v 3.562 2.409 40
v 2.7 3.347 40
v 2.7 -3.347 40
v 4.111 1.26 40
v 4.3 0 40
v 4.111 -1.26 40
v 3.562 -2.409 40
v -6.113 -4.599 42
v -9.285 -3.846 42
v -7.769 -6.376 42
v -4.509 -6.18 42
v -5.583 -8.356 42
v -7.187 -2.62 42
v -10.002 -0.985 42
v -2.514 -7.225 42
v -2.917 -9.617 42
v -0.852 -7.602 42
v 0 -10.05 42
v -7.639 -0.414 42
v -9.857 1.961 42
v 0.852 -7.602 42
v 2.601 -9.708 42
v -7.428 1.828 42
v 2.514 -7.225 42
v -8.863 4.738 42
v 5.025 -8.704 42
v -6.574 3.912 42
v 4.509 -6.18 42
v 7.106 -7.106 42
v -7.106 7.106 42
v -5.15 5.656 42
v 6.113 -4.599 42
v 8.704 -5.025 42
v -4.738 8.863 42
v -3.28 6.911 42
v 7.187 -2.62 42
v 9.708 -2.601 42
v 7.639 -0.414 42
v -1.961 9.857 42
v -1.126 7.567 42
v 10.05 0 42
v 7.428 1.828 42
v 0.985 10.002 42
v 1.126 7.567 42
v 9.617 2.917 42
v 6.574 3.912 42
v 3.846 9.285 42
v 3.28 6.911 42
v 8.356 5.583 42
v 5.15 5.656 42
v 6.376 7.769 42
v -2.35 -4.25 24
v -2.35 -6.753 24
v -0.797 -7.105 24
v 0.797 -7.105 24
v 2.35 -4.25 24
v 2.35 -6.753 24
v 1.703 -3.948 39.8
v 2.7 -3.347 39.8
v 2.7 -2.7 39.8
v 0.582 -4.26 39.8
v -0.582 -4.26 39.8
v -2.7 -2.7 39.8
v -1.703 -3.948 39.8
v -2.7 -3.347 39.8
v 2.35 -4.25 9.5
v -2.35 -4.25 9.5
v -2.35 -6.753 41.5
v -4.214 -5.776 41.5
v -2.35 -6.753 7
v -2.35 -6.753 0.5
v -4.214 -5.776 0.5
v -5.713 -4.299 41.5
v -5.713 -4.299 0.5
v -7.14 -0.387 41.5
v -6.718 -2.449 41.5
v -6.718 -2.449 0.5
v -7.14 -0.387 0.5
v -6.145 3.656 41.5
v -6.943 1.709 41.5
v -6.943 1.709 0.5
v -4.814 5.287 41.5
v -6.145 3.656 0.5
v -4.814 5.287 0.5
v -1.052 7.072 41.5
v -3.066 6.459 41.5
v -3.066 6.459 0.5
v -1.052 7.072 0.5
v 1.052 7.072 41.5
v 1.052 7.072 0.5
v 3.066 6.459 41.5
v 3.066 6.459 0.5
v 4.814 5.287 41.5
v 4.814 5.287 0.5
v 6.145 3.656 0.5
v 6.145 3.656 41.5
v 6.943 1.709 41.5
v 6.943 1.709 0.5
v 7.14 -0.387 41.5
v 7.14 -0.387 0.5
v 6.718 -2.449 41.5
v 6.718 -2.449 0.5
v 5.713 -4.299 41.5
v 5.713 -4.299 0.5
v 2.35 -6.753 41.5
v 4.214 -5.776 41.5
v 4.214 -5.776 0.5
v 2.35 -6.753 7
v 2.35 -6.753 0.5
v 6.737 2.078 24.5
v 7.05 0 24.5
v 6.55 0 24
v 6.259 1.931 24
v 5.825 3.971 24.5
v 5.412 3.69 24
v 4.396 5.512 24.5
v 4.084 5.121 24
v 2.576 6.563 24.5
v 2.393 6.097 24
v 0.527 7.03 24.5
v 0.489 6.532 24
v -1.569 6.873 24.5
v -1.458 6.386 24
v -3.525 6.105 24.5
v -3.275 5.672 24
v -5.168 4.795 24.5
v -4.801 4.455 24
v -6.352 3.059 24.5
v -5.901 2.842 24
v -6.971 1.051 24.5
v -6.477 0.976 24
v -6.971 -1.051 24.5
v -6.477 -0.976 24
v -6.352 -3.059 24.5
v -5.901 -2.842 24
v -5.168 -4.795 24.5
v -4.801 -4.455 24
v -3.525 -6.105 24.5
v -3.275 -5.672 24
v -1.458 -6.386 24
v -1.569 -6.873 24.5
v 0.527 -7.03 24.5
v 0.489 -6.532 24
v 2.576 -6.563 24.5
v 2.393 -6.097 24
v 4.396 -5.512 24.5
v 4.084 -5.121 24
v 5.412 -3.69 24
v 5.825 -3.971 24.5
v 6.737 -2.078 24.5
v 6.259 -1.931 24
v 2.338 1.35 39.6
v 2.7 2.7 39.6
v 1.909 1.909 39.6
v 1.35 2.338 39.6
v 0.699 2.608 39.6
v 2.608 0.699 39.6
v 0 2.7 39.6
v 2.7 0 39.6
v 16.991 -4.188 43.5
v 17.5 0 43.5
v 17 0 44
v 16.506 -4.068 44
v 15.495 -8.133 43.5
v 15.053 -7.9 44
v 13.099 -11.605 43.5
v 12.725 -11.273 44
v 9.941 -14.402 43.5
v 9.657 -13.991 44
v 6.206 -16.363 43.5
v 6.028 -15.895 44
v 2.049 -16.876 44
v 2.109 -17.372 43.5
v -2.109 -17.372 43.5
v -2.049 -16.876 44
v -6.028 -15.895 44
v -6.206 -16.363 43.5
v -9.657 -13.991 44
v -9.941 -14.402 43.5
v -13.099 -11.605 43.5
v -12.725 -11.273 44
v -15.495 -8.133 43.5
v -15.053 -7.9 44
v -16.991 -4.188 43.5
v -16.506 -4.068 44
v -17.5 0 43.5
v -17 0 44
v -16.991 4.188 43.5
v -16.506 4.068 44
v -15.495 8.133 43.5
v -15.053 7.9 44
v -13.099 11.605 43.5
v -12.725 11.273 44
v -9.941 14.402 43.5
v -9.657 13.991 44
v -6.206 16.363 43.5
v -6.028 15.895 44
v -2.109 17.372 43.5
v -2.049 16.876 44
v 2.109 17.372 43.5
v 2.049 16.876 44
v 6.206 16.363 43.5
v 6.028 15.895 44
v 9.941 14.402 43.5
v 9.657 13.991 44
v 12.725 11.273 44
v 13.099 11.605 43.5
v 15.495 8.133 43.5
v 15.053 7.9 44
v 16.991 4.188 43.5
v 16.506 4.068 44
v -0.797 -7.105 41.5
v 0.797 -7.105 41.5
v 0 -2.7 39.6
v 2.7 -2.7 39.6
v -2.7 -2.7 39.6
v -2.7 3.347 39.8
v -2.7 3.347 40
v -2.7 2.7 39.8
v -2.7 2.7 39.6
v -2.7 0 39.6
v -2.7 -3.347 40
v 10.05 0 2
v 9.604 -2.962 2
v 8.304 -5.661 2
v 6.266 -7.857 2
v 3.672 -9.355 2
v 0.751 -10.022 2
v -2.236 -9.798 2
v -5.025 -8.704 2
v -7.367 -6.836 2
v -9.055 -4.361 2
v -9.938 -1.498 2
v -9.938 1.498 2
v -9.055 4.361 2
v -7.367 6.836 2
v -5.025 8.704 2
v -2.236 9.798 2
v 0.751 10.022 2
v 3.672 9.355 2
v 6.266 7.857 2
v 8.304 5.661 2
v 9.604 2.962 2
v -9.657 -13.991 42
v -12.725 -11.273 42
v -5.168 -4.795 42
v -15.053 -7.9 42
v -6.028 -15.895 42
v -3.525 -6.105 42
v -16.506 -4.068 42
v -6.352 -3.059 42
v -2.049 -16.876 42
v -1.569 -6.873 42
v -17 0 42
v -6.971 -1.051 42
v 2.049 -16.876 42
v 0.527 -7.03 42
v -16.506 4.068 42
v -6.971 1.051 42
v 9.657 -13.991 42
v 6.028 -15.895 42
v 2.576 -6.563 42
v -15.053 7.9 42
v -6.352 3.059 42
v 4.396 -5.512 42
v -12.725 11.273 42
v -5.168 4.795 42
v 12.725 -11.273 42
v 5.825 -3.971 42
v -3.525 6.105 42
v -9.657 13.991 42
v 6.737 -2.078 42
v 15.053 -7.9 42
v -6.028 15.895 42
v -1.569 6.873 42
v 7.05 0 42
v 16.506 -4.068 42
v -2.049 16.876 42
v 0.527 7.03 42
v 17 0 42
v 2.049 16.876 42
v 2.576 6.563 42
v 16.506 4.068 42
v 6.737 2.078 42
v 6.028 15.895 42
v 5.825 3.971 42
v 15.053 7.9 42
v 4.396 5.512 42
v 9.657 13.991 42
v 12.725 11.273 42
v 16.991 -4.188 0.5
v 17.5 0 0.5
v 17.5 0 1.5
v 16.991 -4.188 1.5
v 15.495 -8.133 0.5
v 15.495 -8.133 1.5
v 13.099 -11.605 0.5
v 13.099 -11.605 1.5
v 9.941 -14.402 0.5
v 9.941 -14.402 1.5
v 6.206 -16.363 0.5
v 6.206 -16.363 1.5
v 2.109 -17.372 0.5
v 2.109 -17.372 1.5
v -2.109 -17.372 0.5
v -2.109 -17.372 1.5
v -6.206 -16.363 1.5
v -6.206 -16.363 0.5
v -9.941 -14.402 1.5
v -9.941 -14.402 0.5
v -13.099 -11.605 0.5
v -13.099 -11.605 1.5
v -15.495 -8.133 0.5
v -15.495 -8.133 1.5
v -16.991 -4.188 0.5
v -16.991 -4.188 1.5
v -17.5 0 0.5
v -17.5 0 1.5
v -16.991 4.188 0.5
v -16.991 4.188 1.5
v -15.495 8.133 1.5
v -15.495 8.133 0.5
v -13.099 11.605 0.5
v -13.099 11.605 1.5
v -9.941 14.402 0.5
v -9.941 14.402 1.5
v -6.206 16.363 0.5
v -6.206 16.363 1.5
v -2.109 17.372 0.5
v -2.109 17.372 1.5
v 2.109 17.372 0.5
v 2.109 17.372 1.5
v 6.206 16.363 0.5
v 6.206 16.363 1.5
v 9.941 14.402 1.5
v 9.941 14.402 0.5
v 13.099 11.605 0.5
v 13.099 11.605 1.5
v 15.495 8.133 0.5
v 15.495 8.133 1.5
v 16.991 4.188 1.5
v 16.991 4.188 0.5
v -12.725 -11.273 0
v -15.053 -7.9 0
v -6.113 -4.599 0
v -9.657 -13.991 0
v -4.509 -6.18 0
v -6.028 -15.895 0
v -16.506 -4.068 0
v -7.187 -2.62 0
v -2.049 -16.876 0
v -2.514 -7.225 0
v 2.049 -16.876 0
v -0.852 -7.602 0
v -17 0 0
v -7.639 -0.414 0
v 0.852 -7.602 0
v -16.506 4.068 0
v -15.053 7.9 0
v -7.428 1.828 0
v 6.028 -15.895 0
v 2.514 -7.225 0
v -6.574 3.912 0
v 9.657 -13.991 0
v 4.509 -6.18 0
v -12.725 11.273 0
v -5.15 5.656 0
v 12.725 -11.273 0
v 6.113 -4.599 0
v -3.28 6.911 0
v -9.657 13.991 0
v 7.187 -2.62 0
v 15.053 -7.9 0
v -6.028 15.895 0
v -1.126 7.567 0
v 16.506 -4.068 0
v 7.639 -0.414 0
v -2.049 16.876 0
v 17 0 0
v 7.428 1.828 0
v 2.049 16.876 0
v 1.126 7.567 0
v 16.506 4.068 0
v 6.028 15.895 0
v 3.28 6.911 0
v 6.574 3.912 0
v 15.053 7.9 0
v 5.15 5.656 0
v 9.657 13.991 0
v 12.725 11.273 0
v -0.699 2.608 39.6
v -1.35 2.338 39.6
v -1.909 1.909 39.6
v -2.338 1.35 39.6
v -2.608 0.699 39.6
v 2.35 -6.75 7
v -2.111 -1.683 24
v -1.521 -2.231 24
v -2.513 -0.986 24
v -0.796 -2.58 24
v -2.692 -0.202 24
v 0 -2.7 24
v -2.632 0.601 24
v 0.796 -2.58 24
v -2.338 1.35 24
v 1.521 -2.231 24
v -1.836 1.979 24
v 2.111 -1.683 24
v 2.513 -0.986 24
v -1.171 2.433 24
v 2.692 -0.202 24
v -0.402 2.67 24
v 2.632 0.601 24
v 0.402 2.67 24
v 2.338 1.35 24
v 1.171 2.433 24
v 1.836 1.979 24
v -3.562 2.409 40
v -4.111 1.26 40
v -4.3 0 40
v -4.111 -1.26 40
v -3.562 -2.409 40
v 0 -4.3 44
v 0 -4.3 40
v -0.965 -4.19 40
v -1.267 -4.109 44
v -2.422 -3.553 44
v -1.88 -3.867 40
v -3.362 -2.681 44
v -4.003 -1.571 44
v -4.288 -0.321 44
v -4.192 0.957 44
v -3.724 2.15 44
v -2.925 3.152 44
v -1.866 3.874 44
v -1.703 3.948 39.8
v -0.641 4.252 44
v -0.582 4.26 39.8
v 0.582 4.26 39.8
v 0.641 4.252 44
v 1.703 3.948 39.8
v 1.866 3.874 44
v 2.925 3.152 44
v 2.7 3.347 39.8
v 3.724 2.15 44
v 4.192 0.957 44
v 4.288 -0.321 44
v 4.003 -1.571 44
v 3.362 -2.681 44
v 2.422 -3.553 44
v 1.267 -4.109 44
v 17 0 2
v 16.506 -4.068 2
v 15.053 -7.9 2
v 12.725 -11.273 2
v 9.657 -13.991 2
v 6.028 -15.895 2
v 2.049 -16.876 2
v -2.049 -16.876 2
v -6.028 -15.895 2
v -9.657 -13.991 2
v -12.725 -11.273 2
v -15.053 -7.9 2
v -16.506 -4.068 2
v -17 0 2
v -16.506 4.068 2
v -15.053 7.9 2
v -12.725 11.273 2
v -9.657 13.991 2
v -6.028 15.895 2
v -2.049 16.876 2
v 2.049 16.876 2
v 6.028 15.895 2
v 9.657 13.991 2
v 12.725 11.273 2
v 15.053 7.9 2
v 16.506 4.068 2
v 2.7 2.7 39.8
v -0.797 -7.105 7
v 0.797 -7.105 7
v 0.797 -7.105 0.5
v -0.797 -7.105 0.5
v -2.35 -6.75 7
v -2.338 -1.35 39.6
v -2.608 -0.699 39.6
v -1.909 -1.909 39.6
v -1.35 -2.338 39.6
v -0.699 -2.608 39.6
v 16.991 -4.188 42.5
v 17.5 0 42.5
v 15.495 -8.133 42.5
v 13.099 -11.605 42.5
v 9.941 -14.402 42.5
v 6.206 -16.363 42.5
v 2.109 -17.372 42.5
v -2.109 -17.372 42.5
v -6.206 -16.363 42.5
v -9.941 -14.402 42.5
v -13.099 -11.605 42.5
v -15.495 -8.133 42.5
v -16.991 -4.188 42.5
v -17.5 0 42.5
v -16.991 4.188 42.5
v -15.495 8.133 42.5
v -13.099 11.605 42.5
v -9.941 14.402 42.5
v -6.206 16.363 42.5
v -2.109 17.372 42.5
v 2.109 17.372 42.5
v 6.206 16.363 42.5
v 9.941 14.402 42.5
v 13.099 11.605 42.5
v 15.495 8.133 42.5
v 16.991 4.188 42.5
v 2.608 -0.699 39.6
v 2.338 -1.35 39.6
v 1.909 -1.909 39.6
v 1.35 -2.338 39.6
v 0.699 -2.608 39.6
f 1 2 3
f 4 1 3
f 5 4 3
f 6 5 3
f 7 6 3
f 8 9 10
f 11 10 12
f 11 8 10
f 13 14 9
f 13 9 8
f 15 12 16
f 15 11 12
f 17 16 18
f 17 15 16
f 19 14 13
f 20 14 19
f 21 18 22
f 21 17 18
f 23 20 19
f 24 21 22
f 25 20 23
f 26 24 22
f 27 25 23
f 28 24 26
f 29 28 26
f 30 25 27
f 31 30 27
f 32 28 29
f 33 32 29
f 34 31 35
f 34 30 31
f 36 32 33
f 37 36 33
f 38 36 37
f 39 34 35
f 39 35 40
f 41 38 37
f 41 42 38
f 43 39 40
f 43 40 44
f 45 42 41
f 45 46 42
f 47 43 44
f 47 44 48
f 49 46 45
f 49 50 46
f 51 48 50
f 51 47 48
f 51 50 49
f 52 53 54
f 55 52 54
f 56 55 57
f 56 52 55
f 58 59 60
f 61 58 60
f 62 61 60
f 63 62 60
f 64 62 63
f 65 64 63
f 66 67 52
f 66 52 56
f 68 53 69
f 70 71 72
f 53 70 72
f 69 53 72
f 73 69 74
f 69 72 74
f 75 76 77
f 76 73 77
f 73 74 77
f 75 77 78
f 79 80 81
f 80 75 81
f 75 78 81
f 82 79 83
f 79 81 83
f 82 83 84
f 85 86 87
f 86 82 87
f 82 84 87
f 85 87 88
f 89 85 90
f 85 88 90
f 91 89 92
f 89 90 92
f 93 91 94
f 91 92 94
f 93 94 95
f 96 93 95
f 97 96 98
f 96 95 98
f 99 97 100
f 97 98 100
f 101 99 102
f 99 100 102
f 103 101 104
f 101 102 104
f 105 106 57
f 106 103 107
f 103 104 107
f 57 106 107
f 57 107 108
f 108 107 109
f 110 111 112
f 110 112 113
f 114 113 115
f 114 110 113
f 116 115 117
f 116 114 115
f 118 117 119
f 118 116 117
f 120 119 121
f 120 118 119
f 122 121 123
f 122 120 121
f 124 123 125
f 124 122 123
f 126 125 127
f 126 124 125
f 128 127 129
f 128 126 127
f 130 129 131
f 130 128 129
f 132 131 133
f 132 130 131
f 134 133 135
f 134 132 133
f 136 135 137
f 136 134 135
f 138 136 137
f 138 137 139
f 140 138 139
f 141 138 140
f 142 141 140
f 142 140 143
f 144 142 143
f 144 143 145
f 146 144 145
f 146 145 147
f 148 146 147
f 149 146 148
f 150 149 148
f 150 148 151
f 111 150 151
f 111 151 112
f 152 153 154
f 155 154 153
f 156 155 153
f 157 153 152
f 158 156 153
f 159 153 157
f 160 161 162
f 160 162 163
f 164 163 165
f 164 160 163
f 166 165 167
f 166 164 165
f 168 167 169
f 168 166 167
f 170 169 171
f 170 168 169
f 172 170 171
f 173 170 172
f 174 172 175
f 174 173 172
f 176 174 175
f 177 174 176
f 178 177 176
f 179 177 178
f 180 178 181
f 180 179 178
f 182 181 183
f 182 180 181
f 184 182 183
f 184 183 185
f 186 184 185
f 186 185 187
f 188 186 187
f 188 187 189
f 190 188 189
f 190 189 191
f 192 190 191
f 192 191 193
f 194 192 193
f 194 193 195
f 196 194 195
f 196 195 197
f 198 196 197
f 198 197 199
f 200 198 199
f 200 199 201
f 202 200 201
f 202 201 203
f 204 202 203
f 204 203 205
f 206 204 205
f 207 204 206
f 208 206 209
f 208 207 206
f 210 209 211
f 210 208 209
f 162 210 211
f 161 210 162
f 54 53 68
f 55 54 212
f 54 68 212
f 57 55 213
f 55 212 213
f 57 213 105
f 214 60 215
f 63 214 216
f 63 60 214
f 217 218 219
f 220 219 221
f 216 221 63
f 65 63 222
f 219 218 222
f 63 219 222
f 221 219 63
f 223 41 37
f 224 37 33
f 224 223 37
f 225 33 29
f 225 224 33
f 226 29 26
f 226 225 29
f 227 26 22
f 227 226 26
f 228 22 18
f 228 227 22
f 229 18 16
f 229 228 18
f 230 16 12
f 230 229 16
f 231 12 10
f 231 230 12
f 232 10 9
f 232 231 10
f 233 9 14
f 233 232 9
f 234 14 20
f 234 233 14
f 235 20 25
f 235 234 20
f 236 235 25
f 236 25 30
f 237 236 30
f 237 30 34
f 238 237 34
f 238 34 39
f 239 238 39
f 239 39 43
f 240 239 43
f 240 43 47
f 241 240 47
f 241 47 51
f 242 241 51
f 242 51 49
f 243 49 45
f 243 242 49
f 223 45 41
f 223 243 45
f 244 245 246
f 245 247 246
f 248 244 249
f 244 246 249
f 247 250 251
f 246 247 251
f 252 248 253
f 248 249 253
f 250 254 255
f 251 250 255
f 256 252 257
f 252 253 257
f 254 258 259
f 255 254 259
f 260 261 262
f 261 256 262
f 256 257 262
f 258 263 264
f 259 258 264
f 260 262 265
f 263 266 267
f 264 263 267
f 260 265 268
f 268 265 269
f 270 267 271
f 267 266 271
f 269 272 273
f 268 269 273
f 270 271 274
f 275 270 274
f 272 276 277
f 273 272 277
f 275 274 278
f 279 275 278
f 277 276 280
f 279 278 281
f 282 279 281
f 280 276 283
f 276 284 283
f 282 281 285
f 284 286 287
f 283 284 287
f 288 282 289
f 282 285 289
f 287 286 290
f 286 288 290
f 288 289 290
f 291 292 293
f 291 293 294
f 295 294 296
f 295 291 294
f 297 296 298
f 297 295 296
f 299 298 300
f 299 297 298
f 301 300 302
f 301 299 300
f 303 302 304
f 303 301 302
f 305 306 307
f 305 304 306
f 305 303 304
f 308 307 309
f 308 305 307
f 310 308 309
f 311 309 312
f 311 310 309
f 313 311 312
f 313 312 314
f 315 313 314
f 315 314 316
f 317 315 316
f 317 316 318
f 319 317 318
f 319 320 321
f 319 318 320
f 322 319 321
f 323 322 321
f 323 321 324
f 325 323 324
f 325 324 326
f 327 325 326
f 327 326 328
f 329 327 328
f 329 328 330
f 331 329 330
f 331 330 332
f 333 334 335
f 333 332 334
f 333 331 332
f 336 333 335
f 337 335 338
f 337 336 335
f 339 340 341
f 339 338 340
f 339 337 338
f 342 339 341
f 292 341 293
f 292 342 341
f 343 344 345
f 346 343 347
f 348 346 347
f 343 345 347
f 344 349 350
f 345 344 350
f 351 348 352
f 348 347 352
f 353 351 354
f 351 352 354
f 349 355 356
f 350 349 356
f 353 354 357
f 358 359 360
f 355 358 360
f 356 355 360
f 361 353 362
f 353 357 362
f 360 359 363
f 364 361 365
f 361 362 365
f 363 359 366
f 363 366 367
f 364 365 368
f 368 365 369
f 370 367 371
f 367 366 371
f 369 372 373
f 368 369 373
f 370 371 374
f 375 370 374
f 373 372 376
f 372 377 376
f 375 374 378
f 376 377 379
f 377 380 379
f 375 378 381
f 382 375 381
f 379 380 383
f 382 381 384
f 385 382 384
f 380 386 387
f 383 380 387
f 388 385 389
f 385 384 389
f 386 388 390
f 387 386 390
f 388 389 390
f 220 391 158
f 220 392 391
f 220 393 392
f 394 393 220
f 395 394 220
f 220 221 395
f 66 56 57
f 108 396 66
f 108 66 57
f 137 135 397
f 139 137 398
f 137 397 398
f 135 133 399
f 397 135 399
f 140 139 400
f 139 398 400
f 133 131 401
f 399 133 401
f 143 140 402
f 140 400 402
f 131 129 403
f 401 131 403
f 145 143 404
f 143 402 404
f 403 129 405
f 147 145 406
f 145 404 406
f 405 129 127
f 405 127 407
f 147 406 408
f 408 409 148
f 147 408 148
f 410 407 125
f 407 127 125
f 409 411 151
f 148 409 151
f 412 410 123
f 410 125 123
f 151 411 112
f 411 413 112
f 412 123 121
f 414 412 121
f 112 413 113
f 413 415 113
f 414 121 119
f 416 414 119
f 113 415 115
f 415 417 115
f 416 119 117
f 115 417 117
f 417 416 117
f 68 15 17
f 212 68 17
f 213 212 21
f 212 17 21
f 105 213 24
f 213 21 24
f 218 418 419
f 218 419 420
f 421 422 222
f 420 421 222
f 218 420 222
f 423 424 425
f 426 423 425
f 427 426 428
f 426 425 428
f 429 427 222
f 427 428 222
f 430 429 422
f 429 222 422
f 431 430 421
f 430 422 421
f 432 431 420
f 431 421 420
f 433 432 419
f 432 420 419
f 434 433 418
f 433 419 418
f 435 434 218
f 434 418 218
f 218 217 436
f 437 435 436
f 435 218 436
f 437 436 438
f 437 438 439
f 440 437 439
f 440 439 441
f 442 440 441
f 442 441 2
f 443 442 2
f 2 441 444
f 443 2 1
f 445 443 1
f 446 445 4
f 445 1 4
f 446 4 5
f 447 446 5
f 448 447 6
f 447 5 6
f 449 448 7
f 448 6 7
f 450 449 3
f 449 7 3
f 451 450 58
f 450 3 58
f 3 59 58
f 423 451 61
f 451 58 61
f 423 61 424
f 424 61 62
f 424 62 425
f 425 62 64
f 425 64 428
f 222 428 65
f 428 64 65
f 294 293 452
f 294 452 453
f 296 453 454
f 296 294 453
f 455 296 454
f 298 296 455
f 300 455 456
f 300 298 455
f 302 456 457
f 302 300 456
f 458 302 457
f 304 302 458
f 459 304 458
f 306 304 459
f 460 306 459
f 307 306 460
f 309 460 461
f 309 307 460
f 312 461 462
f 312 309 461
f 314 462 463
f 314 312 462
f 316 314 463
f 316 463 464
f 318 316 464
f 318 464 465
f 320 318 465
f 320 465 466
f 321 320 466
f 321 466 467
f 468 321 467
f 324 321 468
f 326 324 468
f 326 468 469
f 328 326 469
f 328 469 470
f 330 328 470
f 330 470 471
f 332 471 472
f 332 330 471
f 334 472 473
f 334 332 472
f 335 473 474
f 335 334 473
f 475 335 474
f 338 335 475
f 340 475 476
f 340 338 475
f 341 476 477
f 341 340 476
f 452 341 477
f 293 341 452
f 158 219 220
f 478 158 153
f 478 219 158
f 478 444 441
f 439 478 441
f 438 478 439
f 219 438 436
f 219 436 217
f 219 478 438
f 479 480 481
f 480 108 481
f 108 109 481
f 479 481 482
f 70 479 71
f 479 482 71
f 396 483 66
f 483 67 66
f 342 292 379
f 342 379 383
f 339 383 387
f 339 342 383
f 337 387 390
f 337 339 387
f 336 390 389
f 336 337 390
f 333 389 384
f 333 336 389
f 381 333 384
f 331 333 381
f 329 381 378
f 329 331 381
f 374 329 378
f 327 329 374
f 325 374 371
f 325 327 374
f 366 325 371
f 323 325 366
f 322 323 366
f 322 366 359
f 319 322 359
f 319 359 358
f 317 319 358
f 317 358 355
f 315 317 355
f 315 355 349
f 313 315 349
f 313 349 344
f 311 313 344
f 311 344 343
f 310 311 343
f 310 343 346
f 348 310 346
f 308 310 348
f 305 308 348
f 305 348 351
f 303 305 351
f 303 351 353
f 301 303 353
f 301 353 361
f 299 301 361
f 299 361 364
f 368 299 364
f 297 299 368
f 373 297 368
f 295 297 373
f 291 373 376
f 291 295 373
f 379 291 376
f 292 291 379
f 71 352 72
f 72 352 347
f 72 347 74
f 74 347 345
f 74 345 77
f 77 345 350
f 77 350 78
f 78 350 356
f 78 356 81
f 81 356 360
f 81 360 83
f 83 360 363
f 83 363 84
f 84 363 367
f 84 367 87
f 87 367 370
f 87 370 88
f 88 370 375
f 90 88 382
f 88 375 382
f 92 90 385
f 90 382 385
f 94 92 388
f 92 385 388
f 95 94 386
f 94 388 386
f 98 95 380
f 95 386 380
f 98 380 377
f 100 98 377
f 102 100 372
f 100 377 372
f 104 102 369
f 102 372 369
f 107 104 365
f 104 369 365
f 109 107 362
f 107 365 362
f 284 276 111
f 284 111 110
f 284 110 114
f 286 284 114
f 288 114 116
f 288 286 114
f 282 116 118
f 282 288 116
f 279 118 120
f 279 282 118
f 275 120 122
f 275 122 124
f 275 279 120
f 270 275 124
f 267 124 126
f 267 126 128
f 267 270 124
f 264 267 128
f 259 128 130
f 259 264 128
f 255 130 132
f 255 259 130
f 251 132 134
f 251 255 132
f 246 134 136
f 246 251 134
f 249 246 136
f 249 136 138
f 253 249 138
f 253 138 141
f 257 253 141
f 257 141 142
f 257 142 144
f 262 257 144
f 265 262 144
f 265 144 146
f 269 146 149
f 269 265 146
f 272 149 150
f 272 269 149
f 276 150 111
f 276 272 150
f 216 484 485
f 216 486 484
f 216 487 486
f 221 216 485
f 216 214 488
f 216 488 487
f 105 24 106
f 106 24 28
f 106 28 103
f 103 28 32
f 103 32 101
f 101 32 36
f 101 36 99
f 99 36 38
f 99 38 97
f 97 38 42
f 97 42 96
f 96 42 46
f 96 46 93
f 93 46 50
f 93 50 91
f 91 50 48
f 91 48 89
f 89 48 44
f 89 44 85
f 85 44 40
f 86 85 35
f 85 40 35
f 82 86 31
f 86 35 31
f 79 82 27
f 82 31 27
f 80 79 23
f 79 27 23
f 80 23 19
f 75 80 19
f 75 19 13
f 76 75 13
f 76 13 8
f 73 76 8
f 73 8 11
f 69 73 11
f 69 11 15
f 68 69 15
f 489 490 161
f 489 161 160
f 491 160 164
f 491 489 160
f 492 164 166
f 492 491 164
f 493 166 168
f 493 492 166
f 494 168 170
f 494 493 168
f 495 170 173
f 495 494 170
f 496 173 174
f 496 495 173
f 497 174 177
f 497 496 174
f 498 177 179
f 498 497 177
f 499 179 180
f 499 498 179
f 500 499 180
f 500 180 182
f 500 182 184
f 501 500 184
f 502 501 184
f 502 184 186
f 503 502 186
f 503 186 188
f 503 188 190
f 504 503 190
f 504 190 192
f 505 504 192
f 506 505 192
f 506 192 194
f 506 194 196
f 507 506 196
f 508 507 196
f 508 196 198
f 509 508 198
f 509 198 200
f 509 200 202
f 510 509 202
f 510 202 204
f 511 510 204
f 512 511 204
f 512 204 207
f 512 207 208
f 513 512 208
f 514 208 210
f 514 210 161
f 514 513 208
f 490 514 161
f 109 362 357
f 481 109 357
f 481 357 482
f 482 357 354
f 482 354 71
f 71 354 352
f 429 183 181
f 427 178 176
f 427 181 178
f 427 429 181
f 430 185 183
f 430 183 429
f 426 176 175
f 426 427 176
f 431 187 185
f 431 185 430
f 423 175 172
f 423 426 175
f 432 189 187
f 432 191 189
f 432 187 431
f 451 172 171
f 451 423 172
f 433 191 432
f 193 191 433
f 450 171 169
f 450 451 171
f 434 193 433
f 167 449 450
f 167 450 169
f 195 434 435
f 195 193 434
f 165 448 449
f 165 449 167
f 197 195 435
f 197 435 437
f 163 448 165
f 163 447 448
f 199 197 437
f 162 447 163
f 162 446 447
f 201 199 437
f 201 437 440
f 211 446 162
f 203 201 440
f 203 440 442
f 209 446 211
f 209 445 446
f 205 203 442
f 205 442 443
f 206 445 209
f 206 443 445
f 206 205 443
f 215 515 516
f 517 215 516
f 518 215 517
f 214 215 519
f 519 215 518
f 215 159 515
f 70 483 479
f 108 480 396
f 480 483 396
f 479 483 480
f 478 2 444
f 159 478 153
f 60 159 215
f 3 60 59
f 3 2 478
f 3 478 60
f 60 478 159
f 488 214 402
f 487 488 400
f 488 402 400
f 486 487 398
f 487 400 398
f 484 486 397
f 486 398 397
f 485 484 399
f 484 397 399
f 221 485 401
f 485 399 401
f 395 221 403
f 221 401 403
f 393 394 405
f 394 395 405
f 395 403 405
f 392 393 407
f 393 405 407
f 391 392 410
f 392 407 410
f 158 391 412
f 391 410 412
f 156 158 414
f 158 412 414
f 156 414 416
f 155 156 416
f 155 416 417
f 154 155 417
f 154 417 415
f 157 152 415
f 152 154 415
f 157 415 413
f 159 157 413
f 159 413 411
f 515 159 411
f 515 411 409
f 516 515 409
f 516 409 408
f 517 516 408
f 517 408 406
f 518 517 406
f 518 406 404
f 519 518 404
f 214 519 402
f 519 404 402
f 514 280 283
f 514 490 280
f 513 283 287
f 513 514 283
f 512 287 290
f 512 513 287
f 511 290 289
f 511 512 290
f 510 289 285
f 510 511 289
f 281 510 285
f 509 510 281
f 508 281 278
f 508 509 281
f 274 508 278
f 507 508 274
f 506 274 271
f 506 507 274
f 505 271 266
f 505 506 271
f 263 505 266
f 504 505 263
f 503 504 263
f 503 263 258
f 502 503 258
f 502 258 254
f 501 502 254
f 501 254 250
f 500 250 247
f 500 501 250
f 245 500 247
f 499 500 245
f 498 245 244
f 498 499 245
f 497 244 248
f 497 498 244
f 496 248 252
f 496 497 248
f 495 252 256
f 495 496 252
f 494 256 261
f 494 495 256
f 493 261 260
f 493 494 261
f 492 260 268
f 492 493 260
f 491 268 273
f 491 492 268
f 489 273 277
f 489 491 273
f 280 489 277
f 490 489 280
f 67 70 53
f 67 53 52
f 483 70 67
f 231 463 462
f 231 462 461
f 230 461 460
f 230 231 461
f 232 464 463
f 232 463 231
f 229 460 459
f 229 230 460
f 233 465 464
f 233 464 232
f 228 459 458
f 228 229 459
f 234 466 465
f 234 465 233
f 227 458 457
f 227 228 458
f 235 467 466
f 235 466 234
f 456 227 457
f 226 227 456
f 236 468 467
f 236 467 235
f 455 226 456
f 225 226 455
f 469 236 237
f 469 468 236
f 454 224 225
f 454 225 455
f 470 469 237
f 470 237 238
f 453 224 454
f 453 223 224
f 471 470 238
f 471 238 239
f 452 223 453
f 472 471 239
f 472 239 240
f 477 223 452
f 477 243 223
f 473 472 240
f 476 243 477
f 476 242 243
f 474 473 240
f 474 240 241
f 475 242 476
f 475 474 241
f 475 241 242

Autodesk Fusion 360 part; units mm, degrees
sketch "Sketch1" plane through (0, 0, 0) normal (0, 0, 1) x (1, 0, 0)
  circle A0 centre (0, 0) radius 10.05
  line L0 (2.35, -4.25) -> (2.35, -9.45)
  line L1 (-2.35, -4.25) -> (2.35, -4.25)
  line L2 (-2.35, -4.25) -> (2.35, -9.45) construction
  line L3 (2.35, -9.45) -> (-2.35, -9.45)
  line L4 (2.35, -4.25) -> (-2.35, -9.45) construction
  line L5 (-2.35, -9.45) -> (-2.35, -4.25)
  circle A1 centre (0, 0) radius 7.15
  circle A2 centre (0, 0) radius 17.5
  line L6 (0, 0) -> (0, -12)
  point P0 (0, -6.85)
  dimension "d1" = 20.1
  dimension "d2" = 4.7
  dimension "d3" = 5.2
  dimension "d4" = 14.3
  dimension "d5" = 2.9
  dimension "d10" = 35
extrude "Extrude1" add sketch "Sketch1" along normal blind 42 contours A0 | L0 L1 A1 L6 | L0 L3 A1 L6 | L1 L5 A1 L6 | L3 L5 A1 L6 makes body 1
extrude "Extrude2" add sketch "Sketch1" along normal blind 2 contours A2 bodies 1
extrude "Extrude3" add sketch "Sketch1" along normal blind 2 from surface at 42 separate body contours A0 | L0 L1 A1 L6 | L0 L3 A1 L6 | L1 L5 A1 L6 | L3 L5 A1 L6 | A2 makes body 2
extrude "Extrude4" add sketch "Sketch1" against normal blind 20 from surface at 44 separate body contours L0 L1 L5 A1 | L0 L1 A1 L6 | L1 L5 A1 L6 makes body 3
combine "Combine1" operation add target body 2 tool bodies 3
move_face "OffsetFaces1" [suppressed]
sketch "Sketch2" plane through (0, 0, 44) normal (0, 0, 1) x (-1, 0, 0)
  circle A0 centre (0, 0) radius 17.5
  circle A1 centre (0, 0) radius 3
extrude "Extrude5" cut sketch "Sketch1" against normal blind 18 from surface at 42 contours L0 L1 A1 L6 | L1 L5 A1 L6 bodies 1
hole "Hole1" at (0, 0, 44) direction (0, 0, -1) diameter 5.4 depth 65 tip angle 118 counterbore diameter 8.6 counterbore depth 4 bodies 2
extrude "Extrude6" cut sketch "Sketch1" along normal blind 7 contours L0 L1 A1 L6 | L1 L5 A1 L6 bodies 1
chamfer "Chamfer1" distance 2.5 angle 45 1 edges at (0, -4.25, 7) on bodies 1
move_face "OffsetFaces3" offset -0.1 1 faces at (7.1145, -0.7119, 36) on bodies 2
sketch "Sketch3" plane through (0, 0, 40) normal (0, 0, 1) x (-1, 0, 0)
  circle A0 centre (0, 0) radius 4.3
  circle A1 centre (0, 0) radius 2.7
  line L0 (-2.7, 2.7) -> (2.7, 2.7)
  line L1 (2.7, 2.7) -> (2.7, -2.7)
  line L2 (2.7, -2.7) -> (-2.7, -2.7)
  line L3 (-2.7, -2.7) -> (-2.7, 2.7)
  line L4 (-2.7, 2.7) -> (2.7, -2.7) construction
  line L5 (2.7, 2.7) -> (-2.7, -2.7) construction
  line L6 (2.7, -2.7) -> (2.7, -3.3466)
  line L7 (2.7, 2.7) -> (2.7, 3.3466)
  line L8 (-2.7, 2.7) -> (-2.7, 3.3466)
  line L9 (-2.7, -2.7) -> (-2.7, -3.3466)
  dimension "d33" = 5.4
  dimension "d34" = 5.4
extrude "Extrude8" cut sketch "Sketch3" against normal blind 0.2 contours A0 L0 L7 L8 | A0 L2 L6 L9 bodies 2
extrude "Extrude9" cut sketch "Sketch3" against normal blind 0.4 contours A1 L0 L1 | A1 L1 L2 | A1 L0 L3 | A1 L2 L3 bodies 2
chamfer "Chamfer2" distance 0.5 angle 45 7 edges at (-16.3157, -6.3283, 44) (-16.3157, 6.3283, 42) (-6.5729, 2.5494, 24) (-16.3157, -6.3283, 2) (-16.3157, -6.3283, 0) (-6.6661, 2.5856, 0) (-6.6661, 2.5856, 42) on bodies 1 2
